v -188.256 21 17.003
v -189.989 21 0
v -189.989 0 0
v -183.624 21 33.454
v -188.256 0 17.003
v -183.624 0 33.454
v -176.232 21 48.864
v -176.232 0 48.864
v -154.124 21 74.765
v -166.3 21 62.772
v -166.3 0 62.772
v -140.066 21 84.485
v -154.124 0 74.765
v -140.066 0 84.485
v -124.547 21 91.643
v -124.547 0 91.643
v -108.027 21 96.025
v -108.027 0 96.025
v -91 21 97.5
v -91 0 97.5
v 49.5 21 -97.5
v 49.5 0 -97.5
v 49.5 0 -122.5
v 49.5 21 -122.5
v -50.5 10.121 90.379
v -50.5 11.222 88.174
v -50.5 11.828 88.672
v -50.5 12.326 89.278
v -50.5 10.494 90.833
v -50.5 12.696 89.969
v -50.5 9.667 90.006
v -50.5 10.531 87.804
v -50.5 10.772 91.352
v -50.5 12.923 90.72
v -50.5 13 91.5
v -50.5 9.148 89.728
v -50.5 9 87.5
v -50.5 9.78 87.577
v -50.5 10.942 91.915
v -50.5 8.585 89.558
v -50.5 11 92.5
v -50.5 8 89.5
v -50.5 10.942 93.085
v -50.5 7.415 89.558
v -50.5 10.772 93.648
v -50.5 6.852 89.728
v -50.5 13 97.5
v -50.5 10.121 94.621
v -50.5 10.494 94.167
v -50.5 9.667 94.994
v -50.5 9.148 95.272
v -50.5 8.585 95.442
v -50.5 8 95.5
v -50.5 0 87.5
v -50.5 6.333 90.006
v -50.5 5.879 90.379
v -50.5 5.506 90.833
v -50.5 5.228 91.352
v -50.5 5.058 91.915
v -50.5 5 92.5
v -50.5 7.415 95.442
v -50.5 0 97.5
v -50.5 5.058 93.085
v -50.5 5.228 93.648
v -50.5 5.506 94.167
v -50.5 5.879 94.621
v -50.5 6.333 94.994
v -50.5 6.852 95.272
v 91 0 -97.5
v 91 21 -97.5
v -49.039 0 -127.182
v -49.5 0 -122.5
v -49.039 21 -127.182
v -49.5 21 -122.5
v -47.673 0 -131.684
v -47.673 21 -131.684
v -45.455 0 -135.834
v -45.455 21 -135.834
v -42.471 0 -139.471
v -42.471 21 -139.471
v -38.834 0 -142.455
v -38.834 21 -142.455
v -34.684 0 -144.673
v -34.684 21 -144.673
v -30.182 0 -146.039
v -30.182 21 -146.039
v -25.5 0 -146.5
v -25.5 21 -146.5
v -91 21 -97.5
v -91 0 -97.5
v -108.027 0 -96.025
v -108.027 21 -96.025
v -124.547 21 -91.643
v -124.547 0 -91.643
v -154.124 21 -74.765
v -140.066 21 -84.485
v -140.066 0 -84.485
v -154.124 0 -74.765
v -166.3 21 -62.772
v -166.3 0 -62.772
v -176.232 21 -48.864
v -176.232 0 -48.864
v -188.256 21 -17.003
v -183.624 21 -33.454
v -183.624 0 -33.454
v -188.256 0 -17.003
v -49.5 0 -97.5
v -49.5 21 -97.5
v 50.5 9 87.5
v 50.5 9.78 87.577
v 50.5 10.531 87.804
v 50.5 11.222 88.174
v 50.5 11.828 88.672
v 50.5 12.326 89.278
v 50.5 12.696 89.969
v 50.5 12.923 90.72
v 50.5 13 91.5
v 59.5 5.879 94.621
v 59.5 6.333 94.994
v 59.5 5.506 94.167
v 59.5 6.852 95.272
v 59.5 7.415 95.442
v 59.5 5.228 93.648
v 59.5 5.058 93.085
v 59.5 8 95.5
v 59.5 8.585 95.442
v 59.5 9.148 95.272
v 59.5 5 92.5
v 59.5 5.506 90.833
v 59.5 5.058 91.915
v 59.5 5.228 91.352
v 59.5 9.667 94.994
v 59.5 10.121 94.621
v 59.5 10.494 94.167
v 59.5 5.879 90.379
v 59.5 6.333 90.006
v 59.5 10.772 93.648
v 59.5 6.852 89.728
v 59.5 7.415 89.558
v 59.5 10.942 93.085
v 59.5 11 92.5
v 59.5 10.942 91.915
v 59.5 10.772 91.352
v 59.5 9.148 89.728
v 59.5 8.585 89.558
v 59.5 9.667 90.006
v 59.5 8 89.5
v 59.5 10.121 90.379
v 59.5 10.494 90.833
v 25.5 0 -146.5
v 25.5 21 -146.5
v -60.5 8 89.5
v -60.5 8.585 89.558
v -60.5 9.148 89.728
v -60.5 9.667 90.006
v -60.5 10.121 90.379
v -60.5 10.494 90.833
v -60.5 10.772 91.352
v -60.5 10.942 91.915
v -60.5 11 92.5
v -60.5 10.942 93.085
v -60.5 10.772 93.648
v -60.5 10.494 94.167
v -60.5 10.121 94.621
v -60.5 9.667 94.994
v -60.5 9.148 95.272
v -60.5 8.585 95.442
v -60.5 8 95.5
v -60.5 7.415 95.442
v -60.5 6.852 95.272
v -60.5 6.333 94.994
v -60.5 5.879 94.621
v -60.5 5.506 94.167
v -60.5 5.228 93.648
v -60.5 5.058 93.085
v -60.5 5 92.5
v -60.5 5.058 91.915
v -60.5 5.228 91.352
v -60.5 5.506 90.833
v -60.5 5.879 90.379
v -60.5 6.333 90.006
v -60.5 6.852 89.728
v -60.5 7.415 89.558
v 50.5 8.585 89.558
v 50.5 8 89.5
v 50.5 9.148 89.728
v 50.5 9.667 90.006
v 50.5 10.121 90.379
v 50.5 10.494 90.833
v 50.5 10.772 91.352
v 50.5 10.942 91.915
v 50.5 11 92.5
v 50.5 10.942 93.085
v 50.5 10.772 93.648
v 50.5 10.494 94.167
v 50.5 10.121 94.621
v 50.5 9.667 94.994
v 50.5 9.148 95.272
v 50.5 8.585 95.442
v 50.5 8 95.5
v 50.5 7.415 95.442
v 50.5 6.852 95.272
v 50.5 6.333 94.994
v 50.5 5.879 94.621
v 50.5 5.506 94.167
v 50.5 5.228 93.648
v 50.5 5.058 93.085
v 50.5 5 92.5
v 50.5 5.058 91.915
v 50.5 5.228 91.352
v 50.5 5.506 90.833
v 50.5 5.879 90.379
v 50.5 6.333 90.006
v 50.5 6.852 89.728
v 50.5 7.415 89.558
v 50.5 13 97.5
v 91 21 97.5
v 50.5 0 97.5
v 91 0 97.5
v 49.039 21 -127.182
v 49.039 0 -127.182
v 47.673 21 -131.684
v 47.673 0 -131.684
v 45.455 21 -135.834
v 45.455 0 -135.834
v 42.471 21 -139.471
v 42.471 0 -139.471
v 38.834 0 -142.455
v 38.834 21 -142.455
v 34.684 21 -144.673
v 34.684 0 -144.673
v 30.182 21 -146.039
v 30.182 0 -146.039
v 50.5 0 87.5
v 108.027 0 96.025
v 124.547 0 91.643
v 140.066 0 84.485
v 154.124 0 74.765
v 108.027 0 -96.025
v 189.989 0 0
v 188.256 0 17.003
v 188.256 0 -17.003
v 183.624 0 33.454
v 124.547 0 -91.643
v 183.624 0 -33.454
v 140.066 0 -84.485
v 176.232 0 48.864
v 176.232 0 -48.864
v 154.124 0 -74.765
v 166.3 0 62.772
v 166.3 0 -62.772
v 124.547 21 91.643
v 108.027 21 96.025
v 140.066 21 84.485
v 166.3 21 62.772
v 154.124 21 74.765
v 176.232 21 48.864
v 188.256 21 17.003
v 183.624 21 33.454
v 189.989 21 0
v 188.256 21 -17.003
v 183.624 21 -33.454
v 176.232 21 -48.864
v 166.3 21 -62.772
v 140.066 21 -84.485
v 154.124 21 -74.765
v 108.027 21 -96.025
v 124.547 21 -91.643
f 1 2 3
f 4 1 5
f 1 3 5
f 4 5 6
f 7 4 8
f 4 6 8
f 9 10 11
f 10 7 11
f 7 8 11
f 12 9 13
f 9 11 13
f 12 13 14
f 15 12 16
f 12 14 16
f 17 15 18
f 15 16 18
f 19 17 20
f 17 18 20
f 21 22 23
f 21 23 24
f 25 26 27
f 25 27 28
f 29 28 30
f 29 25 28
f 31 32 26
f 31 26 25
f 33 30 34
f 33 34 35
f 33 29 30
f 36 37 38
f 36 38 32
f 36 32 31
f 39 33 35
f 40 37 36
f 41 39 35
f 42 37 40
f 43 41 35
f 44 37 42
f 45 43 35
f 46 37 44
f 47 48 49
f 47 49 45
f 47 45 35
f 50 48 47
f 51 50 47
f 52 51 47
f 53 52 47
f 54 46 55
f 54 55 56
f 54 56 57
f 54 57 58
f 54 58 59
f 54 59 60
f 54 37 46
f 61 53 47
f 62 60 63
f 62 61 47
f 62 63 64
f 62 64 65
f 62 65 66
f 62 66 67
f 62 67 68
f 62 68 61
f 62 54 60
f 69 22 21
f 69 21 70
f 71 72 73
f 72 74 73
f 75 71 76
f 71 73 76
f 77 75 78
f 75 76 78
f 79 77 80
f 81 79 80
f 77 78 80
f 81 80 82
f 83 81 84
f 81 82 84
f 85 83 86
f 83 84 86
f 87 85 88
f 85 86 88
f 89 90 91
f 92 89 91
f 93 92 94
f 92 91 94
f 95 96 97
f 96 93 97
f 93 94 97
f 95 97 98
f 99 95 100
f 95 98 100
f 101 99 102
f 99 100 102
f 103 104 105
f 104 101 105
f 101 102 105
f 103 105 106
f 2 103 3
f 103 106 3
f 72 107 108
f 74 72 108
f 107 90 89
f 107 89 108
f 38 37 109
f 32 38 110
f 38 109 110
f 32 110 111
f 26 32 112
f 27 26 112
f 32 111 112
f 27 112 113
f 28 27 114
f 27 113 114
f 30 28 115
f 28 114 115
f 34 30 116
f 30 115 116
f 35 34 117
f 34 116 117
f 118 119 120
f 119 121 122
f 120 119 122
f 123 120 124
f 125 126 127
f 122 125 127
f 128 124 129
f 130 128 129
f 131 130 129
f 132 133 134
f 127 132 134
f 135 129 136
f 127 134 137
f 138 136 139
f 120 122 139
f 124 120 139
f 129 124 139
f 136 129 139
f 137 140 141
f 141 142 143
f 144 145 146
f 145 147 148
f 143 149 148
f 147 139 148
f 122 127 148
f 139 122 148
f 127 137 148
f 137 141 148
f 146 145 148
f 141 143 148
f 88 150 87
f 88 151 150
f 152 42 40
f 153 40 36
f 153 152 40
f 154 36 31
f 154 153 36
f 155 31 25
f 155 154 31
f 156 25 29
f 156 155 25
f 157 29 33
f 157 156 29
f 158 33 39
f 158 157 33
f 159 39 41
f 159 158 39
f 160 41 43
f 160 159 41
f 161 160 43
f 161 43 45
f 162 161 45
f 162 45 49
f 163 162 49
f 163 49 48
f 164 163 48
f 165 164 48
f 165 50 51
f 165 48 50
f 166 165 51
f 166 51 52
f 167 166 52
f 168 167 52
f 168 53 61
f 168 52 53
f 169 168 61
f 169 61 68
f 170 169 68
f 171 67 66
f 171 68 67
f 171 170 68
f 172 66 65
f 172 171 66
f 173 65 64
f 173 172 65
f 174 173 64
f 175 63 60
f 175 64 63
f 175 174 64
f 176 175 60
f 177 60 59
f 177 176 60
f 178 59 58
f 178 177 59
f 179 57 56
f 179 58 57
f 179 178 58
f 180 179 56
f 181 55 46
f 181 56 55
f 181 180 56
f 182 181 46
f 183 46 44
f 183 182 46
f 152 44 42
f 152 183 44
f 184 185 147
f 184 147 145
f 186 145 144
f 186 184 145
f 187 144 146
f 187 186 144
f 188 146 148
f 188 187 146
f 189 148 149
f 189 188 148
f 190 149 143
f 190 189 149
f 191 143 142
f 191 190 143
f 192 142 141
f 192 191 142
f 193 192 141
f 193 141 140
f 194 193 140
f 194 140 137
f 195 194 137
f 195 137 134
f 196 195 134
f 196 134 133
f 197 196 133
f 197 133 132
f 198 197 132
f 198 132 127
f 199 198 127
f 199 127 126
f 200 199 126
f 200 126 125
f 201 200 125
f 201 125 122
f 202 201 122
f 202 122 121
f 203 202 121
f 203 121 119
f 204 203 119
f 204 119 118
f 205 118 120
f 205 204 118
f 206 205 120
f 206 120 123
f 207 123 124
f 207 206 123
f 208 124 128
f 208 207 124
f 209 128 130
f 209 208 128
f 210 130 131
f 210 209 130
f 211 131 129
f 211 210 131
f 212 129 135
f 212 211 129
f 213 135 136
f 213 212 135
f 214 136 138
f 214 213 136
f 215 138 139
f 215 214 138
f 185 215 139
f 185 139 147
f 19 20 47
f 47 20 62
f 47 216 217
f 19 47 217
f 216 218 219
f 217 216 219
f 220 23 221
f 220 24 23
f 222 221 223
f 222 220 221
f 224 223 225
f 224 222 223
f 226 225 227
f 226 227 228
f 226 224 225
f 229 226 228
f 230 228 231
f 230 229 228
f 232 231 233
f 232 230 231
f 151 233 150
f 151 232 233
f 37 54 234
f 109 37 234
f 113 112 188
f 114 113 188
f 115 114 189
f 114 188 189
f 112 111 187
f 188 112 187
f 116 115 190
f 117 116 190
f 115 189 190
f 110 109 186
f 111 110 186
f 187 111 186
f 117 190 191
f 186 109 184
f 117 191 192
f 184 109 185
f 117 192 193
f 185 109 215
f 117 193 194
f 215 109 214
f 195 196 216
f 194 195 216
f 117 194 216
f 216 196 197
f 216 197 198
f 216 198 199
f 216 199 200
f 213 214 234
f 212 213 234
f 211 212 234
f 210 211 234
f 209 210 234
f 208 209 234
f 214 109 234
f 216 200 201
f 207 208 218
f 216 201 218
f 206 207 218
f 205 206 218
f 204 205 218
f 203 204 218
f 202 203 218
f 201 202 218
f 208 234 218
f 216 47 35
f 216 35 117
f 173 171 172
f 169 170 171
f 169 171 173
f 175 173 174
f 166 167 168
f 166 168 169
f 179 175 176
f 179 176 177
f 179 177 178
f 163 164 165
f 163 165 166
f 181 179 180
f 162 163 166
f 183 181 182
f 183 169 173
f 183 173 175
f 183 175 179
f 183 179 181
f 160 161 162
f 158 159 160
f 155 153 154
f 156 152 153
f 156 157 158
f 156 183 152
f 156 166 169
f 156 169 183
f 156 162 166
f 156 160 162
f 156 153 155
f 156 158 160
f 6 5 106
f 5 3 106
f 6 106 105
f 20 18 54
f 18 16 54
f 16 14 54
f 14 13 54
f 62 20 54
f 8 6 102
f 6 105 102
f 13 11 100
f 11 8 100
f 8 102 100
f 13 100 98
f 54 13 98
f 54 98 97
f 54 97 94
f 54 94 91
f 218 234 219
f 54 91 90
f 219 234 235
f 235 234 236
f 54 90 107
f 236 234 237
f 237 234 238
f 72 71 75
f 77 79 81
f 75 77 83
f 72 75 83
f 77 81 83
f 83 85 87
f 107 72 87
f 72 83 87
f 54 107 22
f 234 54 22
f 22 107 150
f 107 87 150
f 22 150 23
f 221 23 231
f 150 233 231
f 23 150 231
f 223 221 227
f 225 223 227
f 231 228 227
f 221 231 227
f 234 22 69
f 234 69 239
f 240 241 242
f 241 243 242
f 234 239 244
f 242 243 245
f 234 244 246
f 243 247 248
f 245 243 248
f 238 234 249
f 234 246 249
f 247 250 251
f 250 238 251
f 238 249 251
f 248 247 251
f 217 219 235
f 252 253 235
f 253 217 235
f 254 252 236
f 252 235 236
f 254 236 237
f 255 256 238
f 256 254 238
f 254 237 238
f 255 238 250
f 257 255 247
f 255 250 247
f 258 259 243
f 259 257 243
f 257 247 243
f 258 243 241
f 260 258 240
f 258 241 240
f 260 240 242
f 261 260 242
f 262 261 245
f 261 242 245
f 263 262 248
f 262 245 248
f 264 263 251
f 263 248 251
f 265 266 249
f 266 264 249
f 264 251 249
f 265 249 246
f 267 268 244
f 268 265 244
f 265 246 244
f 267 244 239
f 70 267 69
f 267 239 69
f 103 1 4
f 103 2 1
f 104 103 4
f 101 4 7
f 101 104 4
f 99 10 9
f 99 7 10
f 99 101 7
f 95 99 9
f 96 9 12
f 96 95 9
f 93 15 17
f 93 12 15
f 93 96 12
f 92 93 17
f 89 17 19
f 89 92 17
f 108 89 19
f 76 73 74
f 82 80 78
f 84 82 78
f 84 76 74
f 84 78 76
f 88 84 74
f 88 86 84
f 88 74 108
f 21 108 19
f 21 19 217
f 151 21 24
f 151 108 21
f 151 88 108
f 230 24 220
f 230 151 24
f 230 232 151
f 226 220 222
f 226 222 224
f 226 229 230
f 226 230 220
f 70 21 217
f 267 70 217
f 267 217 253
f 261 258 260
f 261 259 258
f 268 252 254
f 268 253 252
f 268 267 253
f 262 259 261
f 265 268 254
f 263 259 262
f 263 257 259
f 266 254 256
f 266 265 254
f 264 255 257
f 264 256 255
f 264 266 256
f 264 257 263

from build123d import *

# Parameters (mm, degrees)
SKETCH1_W               = 380
SKETCH1_H               = 195
BOSS_EXTRUDE1_DEPTH     = 21
FILLET1_R               = 99
SKETCH2_W               = 101
SKETCH2_H               = 20
CUT_EXTRUDE1_DEPTH      = 13
FILLET2_R               = 4
CUT_EXTRUDE2_DEPTH      = 110
CUT_EXTRUDE2_DEPTH_BACK = 10
SKETCH3_R               = 3
SKETCH4_W               = 99
SKETCH4_H               = 21
BOSS_EXTRUDE2_DEPTH     = 49
FILLET3_R               = 24


with BuildPart() as part:
    # Sketch1 → Boss-Extrude1 (new body)
    with BuildSketch(Plane(origin=(0, 0, 0), x_dir=(1, 0, 0), z_dir=(0, 1, 0))):
        Rectangle(SKETCH1_W, SKETCH1_H)
    extrude(amount=BOSS_EXTRUDE1_DEPTH)

    # Fillet1
    # the kernel refuses this fillet: 99 mm, written as the material it takes off along each edge
    with BuildSketch(Plane(origin=(-190, -247.5, 97.5), x_dir=(0, 0, -1), z_dir=(0, 1, 0)), Plane(origin=(-190, -247.5, -97.5), x_dir=(1, 0, 0), z_dir=(0, 1, 0)), Plane(origin=(190, -247.5, 97.5), x_dir=(-1, 0, 0), z_dir=(0, 1, 0))) as fillet1_piece_1:
        with BuildLine():
            CenterArc((FILLET1_R, -FILLET1_R), FILLET1_R, 90, 90)
            Line((0, -FILLET1_R), (0, 0))
            Line((0, 0), (FILLET1_R, 0))
        make_face()
    extrude(amount=516, mode=Mode.SUBTRACT)
    with BuildSketch(Plane(origin=(190, -247.5, -97.5), x_dir=(-1, 0, 0), z_dir=(0, 1, 0))) as fillet1_piece_2:
        with BuildLine():
            CenterArc((FILLET1_R, FILLET1_R), FILLET1_R, 180, 90)
            Line((0, FILLET1_R), (0, 0))
            Line((0, 0), (FILLET1_R, 0))
        make_face()
    extrude(amount=516, mode=Mode.SUBTRACT)

    # Sketch2 → Cut-Extrude1 (cut)
    with BuildSketch(Plane.XZ):
        with Locations((0, 97.5)):
            Rectangle(SKETCH2_W, SKETCH2_H)
    extrude(amount=-CUT_EXTRUDE1_DEPTH, mode=Mode.SUBTRACT)

    # Fillet2
    fillet2_edges = [part.edges().sort_by_distance(p)[0] for p in [
        (0, 13, 87.5),
    ]]
    fillet(fillet2_edges, radius=FILLET2_R)

    # Sketch3 → Cut-Extrude2 (cut, two sides: drawn at the far end of the back side and taken through both)
    with BuildSketch(Plane(origin=(-50.5, 0, 0), x_dir=(0, 0, -1), z_dir=(1, 0, 0)).offset(-CUT_EXTRUDE2_DEPTH_BACK)):
        with Locations((-92.5, 8)):
            Circle(SKETCH3_R)
    extrude(amount=CUT_EXTRUDE2_DEPTH + CUT_EXTRUDE2_DEPTH_BACK, mode=Mode.SUBTRACT)

    # Sketch4 → Boss-Extrude2 (add)
    with BuildSketch(Plane(origin=(0, 0, -97.5), x_dir=(-1, 0, 0), z_dir=(0, 0, -1))):
        with Locations((0, 10.5)):
            Rectangle(SKETCH4_W, SKETCH4_H)
    extrude(amount=BOSS_EXTRUDE2_DEPTH)

    # Fillet3
    fillet3_edges = [part.edges().sort_by_distance(p)[0] for p in [
        (49.5, 10.5, -146.5),
        (-49.5, 10.5, -146.5),
    ]]
    fillet(fillet3_edges, radius=FILLET3_R)


solid = part.part
